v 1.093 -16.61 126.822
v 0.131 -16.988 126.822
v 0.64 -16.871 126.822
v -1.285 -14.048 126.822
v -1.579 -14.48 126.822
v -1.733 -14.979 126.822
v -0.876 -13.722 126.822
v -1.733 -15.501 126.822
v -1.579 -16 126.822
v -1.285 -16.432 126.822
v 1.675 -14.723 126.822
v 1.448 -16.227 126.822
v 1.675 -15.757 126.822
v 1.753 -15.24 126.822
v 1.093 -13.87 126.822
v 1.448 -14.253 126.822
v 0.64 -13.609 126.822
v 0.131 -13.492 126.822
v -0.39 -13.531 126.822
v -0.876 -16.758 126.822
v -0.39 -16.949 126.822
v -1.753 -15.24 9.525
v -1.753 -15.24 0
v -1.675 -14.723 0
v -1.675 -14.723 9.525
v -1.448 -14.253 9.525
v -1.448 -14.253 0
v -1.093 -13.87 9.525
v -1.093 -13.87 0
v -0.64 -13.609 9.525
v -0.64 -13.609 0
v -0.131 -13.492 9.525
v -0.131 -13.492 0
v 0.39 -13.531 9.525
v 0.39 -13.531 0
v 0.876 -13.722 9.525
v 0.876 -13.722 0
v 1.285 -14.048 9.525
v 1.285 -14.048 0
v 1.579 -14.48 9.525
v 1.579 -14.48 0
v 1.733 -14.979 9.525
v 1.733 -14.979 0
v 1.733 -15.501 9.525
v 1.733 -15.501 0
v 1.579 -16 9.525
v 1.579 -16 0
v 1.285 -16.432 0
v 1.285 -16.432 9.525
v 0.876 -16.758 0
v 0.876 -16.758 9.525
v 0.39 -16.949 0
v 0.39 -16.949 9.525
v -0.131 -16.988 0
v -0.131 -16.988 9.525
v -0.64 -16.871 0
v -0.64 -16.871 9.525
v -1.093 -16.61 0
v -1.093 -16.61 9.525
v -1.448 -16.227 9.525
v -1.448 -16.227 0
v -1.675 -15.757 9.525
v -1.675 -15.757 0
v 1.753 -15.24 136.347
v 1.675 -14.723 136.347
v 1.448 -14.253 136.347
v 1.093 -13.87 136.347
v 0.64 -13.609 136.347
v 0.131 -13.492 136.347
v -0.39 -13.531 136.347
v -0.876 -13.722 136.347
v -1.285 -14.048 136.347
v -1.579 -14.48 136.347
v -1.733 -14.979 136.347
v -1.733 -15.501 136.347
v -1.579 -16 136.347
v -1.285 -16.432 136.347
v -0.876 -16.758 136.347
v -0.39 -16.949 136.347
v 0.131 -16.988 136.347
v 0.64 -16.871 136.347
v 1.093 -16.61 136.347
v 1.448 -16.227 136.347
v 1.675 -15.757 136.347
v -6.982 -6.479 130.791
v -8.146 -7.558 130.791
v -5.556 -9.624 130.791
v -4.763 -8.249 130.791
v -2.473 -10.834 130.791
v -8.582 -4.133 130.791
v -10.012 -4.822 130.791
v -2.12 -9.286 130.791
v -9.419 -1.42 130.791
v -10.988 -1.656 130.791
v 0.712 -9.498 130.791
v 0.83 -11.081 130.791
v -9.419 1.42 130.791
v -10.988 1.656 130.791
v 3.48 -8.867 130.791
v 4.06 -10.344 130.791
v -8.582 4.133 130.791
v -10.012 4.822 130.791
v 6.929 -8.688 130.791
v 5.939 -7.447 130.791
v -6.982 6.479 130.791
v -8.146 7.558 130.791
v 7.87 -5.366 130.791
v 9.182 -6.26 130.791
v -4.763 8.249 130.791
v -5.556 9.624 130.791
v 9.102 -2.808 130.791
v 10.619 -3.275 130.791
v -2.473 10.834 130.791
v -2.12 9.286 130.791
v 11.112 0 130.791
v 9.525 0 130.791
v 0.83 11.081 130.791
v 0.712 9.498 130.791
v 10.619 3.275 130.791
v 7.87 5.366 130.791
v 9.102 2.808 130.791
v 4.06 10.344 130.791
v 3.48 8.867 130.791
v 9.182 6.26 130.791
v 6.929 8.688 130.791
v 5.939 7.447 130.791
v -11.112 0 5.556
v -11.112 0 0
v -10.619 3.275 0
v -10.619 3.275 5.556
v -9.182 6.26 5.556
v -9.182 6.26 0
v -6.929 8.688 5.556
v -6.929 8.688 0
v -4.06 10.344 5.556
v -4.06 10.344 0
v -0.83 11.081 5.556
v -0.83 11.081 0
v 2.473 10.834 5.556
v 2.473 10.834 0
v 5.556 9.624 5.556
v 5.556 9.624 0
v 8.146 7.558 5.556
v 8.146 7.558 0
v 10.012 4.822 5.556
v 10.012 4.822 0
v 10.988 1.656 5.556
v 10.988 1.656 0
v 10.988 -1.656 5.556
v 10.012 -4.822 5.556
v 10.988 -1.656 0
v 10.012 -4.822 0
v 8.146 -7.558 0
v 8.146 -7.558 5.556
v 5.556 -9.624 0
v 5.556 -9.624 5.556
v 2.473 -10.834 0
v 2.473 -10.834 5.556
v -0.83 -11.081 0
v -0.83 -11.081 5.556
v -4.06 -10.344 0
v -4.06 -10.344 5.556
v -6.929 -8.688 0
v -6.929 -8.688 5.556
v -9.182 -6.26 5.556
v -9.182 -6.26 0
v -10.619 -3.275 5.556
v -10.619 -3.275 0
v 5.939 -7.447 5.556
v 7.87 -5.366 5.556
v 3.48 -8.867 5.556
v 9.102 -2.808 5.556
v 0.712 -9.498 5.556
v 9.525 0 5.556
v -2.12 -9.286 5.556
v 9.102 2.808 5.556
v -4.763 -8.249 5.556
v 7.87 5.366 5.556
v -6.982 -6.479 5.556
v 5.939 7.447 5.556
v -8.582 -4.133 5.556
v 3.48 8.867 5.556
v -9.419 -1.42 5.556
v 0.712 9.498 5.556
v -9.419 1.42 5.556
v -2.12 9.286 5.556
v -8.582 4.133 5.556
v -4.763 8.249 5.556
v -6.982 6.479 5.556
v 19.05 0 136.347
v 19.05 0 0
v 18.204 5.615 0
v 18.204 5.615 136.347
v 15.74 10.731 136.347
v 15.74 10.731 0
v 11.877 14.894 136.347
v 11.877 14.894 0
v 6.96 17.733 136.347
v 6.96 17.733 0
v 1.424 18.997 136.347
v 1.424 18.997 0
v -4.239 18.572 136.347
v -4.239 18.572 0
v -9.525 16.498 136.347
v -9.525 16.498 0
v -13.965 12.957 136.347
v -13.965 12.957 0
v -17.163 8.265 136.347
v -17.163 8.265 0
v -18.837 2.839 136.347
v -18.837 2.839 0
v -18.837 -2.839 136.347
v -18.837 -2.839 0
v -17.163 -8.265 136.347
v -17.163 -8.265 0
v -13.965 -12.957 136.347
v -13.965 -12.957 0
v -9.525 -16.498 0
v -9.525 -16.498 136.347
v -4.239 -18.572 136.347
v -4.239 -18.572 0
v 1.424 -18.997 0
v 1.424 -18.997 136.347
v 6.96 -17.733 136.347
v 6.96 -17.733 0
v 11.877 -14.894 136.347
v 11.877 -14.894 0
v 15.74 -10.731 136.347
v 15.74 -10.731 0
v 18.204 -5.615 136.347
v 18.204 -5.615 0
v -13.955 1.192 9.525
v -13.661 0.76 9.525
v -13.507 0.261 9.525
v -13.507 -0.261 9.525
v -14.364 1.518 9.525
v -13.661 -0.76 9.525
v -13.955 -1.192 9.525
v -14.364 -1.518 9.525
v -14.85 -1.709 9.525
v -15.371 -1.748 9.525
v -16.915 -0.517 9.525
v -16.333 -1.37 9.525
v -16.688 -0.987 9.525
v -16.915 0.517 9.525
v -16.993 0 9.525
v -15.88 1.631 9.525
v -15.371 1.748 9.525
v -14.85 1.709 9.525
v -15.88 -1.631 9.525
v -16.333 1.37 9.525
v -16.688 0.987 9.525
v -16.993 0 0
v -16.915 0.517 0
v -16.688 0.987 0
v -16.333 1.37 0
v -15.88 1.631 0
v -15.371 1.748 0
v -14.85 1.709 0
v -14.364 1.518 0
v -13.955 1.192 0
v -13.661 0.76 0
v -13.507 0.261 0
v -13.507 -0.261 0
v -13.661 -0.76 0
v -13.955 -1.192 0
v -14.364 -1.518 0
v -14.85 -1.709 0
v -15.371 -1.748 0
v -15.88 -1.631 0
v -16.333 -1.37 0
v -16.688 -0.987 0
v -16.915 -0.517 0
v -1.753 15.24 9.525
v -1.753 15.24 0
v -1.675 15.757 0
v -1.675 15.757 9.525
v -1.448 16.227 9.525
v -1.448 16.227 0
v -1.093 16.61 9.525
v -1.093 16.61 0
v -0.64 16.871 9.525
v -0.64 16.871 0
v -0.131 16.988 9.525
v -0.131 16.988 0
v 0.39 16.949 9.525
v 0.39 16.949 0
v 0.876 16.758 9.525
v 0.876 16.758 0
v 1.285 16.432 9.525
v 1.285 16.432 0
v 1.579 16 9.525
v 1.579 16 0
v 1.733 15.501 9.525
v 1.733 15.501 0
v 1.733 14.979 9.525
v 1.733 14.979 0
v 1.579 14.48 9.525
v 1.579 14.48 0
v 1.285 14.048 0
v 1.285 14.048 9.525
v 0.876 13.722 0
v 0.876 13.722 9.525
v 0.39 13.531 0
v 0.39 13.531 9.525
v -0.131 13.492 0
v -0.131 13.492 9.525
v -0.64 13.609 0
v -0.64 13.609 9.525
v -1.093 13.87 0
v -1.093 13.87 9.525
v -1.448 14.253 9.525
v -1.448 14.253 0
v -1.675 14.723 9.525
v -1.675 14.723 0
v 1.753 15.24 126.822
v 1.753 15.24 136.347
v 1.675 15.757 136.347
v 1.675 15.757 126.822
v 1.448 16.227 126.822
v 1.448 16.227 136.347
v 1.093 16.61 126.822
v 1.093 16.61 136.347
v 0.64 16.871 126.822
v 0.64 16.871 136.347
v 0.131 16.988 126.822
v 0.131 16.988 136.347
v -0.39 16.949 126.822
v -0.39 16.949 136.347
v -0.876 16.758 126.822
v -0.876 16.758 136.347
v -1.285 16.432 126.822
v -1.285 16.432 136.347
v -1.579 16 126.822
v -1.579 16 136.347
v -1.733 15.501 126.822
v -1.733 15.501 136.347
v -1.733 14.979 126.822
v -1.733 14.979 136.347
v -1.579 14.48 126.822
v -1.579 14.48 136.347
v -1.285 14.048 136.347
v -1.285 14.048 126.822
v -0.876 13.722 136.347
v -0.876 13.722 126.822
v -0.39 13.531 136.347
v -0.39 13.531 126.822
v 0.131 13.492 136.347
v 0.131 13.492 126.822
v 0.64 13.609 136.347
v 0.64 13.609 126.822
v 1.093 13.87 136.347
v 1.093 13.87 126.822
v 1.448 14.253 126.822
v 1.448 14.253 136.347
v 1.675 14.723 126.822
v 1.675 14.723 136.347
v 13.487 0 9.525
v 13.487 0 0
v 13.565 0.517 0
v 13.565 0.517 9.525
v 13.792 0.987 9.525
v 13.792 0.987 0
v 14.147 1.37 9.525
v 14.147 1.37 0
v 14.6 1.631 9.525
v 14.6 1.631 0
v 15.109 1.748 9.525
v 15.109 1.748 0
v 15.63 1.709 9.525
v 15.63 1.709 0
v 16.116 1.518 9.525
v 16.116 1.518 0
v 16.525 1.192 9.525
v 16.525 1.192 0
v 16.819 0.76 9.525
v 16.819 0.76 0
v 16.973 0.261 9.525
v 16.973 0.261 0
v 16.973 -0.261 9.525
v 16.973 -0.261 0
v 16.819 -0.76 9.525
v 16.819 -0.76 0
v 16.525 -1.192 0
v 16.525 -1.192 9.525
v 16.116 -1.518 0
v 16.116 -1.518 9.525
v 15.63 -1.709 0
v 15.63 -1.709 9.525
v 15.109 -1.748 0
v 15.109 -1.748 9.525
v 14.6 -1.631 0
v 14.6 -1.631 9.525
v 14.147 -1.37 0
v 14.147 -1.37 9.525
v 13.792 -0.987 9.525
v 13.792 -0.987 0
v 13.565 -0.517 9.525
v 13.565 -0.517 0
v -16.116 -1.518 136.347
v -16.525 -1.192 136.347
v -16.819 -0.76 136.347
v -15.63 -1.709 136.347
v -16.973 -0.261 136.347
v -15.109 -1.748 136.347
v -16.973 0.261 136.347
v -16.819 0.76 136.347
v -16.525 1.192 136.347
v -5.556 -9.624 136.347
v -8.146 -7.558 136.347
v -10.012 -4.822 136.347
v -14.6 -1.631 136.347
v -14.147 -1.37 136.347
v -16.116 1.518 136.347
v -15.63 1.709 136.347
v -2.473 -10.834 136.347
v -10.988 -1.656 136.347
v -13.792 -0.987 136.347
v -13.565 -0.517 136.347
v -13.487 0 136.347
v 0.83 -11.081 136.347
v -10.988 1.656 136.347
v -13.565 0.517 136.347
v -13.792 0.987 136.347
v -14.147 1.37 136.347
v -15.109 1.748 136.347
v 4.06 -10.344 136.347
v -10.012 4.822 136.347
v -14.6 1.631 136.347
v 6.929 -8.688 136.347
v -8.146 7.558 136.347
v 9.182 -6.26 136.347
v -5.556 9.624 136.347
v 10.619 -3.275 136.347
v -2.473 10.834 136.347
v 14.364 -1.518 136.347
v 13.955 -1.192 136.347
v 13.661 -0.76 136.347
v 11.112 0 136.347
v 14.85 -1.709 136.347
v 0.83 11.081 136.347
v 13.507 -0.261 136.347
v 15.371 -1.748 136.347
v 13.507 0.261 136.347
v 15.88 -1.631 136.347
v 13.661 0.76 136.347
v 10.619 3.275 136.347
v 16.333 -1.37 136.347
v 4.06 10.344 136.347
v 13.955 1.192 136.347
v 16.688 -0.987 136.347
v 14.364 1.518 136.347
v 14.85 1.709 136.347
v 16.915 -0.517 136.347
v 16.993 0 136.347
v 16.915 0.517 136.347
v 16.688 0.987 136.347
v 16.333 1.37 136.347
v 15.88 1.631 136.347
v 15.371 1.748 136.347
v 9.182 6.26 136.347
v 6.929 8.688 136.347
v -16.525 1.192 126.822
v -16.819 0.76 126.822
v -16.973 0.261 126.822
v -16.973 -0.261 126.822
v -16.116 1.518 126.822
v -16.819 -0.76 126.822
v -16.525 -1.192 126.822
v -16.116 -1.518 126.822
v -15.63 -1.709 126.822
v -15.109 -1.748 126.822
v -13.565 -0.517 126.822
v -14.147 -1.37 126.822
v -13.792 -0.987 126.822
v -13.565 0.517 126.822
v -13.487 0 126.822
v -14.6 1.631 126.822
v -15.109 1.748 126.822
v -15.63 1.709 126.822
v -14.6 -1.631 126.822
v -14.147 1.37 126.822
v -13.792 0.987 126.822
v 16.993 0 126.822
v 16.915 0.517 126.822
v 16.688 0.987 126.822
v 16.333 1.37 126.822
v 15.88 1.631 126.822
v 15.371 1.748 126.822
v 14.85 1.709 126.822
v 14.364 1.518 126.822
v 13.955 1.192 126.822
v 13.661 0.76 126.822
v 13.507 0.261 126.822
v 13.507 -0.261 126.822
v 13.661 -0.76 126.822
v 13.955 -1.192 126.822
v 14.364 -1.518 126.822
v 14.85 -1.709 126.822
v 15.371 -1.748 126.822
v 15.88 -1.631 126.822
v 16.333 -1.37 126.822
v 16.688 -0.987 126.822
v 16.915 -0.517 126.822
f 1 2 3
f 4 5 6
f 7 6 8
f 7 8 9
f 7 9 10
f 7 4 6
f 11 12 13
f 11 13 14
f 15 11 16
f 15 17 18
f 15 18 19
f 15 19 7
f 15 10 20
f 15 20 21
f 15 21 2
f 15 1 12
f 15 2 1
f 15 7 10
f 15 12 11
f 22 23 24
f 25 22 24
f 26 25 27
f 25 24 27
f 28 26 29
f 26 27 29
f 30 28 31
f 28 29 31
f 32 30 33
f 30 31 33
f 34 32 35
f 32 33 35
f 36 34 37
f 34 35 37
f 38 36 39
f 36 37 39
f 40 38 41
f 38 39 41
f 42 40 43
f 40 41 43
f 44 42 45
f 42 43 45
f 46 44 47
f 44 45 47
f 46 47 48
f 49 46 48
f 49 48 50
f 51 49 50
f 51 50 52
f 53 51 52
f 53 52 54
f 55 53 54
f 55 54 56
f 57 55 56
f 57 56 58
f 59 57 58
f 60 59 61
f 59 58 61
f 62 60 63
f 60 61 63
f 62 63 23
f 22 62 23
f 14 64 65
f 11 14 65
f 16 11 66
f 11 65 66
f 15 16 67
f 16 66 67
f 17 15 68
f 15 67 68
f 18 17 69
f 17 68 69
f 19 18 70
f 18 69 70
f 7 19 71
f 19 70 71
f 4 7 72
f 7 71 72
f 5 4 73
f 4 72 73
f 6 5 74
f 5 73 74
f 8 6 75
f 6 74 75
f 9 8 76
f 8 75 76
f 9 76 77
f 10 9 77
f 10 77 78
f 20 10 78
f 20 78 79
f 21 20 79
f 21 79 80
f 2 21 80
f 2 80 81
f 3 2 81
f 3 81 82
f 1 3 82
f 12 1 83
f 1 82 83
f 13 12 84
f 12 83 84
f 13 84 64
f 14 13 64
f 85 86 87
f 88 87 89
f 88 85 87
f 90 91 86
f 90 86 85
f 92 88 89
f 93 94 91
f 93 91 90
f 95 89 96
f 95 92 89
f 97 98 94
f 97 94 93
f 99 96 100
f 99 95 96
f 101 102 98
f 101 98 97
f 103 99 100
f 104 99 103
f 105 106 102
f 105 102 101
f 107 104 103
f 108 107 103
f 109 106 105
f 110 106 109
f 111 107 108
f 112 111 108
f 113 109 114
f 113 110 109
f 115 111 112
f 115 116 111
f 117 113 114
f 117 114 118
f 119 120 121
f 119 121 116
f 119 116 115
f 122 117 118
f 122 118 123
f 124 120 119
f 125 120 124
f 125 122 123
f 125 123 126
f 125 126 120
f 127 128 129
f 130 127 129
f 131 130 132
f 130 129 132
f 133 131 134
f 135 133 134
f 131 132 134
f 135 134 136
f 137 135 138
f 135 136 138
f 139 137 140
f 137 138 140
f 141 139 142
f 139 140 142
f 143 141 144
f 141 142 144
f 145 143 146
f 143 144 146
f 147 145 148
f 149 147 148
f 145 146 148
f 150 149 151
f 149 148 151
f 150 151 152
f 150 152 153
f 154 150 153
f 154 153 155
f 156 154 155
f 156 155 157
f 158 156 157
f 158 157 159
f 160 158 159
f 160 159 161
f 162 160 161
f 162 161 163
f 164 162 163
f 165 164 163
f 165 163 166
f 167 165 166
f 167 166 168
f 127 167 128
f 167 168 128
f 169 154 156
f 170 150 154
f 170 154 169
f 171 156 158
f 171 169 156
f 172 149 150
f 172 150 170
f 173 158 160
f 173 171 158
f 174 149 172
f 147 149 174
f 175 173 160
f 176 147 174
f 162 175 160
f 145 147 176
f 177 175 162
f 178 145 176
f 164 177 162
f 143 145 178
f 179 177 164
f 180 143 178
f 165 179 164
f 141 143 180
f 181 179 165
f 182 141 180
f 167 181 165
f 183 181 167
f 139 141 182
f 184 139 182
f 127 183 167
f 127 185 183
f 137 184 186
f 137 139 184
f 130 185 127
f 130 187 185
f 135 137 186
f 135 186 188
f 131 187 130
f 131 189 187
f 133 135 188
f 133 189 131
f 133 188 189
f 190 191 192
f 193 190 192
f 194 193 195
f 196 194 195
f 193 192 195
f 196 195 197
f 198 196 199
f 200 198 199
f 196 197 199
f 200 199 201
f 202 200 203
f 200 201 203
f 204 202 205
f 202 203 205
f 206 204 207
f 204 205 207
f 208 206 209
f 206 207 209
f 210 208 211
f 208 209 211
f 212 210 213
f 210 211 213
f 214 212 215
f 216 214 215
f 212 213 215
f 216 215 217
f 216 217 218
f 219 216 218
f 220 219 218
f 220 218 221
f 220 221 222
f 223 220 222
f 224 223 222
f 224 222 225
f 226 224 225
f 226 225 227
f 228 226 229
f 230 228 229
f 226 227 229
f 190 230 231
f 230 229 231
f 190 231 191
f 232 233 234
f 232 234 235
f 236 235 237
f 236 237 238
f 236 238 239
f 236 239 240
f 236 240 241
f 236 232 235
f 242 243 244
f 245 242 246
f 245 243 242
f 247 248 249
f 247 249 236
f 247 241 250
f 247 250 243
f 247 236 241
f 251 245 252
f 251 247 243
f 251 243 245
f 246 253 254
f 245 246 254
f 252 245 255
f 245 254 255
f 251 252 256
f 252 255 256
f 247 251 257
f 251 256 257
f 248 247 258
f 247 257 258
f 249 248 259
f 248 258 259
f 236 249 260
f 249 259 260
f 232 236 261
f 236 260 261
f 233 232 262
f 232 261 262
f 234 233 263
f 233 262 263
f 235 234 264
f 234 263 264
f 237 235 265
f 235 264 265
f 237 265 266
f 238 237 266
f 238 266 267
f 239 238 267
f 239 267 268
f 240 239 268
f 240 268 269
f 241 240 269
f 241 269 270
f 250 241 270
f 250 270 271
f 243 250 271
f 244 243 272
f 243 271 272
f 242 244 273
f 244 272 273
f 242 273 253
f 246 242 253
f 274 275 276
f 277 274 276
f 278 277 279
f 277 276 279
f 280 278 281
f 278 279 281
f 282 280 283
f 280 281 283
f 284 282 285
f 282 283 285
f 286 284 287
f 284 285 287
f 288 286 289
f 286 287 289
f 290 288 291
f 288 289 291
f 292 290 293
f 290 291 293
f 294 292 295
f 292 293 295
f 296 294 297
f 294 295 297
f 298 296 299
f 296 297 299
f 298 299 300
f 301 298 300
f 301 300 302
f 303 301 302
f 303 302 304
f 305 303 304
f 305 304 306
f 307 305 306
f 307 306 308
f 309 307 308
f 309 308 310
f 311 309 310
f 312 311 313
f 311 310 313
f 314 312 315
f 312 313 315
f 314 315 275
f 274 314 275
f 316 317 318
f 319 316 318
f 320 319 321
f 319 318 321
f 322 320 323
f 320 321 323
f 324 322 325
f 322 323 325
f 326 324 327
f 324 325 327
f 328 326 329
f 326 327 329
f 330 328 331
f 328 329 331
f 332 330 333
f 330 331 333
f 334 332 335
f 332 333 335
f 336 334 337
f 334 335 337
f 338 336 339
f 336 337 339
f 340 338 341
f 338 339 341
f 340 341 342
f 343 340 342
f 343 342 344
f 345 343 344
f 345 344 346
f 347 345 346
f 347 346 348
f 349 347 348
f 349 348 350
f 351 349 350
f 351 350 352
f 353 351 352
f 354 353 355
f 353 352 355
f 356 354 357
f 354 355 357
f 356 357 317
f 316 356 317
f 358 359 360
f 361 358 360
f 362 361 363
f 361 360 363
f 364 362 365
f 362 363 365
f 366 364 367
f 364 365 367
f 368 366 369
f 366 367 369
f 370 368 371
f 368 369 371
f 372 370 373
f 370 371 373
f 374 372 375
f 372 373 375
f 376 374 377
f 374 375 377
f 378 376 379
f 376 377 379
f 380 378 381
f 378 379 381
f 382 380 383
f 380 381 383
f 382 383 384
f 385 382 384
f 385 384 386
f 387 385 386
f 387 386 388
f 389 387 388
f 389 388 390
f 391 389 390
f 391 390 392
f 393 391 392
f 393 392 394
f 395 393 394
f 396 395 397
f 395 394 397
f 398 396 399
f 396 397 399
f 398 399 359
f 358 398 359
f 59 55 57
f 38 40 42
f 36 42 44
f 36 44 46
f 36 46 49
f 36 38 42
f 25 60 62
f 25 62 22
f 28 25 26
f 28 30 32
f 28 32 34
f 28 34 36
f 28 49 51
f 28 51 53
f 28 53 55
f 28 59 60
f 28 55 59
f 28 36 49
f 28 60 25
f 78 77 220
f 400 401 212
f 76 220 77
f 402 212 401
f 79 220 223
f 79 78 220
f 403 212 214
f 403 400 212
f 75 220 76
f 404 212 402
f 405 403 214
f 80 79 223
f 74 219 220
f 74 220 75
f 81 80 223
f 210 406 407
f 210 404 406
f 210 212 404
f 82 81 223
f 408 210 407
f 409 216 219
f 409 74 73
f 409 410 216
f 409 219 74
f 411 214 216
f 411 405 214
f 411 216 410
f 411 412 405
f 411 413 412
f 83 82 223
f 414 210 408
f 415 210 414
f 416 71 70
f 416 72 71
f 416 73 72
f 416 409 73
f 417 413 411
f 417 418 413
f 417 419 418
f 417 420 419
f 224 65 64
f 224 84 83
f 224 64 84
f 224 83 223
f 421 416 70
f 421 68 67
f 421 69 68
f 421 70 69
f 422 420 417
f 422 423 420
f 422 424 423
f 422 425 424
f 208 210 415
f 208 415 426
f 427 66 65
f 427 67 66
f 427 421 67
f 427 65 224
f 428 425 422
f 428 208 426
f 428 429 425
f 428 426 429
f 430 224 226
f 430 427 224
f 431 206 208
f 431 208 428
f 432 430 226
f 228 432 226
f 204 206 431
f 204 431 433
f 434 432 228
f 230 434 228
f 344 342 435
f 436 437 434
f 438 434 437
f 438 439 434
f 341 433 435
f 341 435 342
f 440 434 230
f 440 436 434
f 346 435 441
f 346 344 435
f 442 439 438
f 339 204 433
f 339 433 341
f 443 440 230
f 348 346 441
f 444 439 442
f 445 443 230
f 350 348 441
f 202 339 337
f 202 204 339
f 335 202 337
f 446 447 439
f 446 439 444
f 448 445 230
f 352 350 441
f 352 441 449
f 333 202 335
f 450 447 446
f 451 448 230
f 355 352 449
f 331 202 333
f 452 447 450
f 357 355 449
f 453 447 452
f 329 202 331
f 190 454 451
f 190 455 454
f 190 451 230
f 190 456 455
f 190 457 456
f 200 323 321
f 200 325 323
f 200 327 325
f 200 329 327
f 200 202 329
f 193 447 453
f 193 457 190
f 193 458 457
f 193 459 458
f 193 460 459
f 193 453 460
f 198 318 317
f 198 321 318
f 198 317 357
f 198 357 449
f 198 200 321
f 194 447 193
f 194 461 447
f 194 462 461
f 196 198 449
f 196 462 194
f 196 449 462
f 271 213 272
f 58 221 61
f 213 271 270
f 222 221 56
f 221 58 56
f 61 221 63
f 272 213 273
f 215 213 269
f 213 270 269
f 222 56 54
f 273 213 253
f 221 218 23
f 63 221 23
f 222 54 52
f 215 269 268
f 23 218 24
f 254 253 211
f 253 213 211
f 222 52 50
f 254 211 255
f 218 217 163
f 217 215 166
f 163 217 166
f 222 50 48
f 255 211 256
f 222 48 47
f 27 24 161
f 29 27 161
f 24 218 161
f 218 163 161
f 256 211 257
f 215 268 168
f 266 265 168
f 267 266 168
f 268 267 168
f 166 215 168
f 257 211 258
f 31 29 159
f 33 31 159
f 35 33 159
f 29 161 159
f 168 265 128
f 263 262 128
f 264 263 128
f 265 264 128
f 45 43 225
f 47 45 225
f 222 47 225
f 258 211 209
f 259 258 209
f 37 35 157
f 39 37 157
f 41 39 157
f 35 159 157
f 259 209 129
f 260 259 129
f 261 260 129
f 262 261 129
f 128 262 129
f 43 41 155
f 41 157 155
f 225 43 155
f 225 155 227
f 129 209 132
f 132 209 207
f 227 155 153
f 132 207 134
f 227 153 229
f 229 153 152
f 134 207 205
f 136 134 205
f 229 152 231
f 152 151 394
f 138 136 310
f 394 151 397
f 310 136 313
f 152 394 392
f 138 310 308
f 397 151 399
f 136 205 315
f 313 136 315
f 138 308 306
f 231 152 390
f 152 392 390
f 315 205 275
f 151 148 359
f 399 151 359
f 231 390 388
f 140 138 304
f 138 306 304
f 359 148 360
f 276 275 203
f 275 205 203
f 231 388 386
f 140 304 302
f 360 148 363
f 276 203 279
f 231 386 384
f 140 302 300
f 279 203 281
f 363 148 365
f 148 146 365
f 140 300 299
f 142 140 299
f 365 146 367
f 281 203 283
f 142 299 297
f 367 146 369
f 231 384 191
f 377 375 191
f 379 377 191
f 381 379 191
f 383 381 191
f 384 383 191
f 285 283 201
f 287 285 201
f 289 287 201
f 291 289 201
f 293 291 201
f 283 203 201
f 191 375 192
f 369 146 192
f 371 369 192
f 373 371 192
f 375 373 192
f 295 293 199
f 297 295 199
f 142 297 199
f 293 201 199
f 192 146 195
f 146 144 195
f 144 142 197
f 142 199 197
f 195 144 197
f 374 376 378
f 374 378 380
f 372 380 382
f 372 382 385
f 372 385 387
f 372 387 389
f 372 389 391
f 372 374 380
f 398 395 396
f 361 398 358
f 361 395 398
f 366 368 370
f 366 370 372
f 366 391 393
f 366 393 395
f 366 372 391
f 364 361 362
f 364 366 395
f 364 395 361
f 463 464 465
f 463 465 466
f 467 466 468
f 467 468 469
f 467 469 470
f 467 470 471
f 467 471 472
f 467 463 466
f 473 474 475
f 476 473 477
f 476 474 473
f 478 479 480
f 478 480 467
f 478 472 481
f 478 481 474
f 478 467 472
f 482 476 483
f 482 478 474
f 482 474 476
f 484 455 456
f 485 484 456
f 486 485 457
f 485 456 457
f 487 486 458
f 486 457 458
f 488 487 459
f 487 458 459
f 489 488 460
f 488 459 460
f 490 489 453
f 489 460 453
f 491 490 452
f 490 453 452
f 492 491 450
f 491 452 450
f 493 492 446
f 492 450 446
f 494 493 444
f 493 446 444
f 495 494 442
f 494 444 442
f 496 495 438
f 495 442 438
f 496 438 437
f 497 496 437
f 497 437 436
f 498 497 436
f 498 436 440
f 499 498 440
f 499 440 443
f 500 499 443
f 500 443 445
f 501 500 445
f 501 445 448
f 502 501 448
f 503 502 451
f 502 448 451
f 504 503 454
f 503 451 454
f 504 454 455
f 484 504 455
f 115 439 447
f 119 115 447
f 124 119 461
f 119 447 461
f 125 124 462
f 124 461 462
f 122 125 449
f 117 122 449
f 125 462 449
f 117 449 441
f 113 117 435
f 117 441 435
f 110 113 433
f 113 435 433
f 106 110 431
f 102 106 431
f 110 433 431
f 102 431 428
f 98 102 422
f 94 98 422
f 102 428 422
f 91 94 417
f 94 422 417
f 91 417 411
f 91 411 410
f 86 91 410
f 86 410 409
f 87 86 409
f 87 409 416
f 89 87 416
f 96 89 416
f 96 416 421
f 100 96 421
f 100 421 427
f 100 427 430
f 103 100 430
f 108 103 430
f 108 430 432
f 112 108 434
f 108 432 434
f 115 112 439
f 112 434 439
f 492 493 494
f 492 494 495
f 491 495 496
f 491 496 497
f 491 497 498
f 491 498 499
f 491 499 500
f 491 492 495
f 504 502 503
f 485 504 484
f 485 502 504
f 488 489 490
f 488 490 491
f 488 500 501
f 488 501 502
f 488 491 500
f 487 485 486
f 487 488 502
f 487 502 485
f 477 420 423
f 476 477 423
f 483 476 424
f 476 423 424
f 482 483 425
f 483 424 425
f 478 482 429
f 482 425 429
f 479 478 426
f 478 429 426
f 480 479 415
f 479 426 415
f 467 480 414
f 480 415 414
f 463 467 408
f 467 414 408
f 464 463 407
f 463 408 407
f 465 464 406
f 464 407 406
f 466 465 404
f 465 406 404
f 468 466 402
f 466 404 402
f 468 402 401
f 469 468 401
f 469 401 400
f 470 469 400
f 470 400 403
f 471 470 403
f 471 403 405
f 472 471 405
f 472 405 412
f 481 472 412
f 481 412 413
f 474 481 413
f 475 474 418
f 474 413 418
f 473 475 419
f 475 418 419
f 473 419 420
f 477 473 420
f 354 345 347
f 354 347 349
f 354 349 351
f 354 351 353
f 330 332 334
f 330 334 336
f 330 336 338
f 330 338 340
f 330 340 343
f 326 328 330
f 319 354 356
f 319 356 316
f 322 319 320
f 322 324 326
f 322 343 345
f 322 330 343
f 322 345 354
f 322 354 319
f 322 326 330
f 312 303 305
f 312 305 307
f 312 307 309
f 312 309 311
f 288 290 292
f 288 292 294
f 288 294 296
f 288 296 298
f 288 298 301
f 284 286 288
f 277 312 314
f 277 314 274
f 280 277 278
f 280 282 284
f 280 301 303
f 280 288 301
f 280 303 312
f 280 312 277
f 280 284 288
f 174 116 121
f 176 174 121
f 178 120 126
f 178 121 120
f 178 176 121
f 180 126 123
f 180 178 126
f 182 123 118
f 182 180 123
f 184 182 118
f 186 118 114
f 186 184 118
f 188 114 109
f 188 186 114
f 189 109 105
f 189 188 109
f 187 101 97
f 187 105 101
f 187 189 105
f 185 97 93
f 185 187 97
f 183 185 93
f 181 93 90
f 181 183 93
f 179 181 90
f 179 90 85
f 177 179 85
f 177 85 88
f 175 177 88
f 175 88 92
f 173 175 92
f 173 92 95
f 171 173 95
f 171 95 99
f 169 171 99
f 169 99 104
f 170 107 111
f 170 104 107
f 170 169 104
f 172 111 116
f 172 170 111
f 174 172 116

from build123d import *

# Parameters (mm, degrees)
SKETCH1_R           = 19.05
SKETCH1_R_2         = 9.525
BOSS_EXTRUDE1_DEPTH = 136.3472
SKETCH2_R           = 1.7526
CUT_EXTRUDE1_DEPTH  = 9.525
SKETCH3_R           = 1.7526
CUT_EXTRUDE2_DEPTH  = 9.525
SKETCH6_R           = 11.1125
CUT_EXTRUDE3_DEPTH  = 5.55625
SKETCH7_R           = 11.1125
CUT_EXTRUDE4_DEPTH  = 5.55625


with BuildPart() as part:
    # Sketch1 → Boss-Extrude1 (new body)
    with BuildSketch(Plane.XY):
        Circle(SKETCH1_R)
        Circle(SKETCH1_R_2, mode=Mode.SUBTRACT)
    extrude(amount=BOSS_EXTRUDE1_DEPTH)

    # Sketch2 → Cut-Extrude1 (cut)
    with BuildSketch(Plane(origin=(0, 0, 0), x_dir=(-1, 0, 0), z_dir=(0, 0, -1))):
        with Locations((0, 15.24)):
            Circle(SKETCH2_R)
        with Locations((15.24, 0)):
            Circle(SKETCH2_R)
        with Locations((0, -15.24)):
            Circle(SKETCH2_R)
        with Locations((-15.24, 0)):
            Circle(SKETCH2_R)
    extrude(amount=-CUT_EXTRUDE1_DEPTH, mode=Mode.SUBTRACT)

    # Sketch3 → Cut-Extrude2 (cut)
    with BuildSketch(Plane.XY.offset(136.3472)):
        with Locations((0, 15.24)):
            Circle(SKETCH3_R)
        with Locations((15.24, 0)):
            Circle(SKETCH3_R)
        with Locations((0, -15.24)):
            Circle(SKETCH3_R)
        with Locations((-15.24, 0)):
            Circle(SKETCH3_R)
    extrude(amount=-CUT_EXTRUDE2_DEPTH, mode=Mode.SUBTRACT)

    # Sketch6 → Cut-Extrude3 (cut)
    with BuildSketch(Plane.XY.offset(136.3472)):
        Circle(SKETCH6_R)
    extrude(amount=-CUT_EXTRUDE3_DEPTH, mode=Mode.SUBTRACT)

    # Sketch7 → Cut-Extrude4 (cut)
    with BuildSketch(Plane(origin=(0, 0, 0), x_dir=(-1, 0, 0), z_dir=(0, 0, -1))):
        Circle(SKETCH7_R)
    extrude(amount=-CUT_EXTRUDE4_DEPTH, mode=Mode.SUBTRACT)


solid = part.part
